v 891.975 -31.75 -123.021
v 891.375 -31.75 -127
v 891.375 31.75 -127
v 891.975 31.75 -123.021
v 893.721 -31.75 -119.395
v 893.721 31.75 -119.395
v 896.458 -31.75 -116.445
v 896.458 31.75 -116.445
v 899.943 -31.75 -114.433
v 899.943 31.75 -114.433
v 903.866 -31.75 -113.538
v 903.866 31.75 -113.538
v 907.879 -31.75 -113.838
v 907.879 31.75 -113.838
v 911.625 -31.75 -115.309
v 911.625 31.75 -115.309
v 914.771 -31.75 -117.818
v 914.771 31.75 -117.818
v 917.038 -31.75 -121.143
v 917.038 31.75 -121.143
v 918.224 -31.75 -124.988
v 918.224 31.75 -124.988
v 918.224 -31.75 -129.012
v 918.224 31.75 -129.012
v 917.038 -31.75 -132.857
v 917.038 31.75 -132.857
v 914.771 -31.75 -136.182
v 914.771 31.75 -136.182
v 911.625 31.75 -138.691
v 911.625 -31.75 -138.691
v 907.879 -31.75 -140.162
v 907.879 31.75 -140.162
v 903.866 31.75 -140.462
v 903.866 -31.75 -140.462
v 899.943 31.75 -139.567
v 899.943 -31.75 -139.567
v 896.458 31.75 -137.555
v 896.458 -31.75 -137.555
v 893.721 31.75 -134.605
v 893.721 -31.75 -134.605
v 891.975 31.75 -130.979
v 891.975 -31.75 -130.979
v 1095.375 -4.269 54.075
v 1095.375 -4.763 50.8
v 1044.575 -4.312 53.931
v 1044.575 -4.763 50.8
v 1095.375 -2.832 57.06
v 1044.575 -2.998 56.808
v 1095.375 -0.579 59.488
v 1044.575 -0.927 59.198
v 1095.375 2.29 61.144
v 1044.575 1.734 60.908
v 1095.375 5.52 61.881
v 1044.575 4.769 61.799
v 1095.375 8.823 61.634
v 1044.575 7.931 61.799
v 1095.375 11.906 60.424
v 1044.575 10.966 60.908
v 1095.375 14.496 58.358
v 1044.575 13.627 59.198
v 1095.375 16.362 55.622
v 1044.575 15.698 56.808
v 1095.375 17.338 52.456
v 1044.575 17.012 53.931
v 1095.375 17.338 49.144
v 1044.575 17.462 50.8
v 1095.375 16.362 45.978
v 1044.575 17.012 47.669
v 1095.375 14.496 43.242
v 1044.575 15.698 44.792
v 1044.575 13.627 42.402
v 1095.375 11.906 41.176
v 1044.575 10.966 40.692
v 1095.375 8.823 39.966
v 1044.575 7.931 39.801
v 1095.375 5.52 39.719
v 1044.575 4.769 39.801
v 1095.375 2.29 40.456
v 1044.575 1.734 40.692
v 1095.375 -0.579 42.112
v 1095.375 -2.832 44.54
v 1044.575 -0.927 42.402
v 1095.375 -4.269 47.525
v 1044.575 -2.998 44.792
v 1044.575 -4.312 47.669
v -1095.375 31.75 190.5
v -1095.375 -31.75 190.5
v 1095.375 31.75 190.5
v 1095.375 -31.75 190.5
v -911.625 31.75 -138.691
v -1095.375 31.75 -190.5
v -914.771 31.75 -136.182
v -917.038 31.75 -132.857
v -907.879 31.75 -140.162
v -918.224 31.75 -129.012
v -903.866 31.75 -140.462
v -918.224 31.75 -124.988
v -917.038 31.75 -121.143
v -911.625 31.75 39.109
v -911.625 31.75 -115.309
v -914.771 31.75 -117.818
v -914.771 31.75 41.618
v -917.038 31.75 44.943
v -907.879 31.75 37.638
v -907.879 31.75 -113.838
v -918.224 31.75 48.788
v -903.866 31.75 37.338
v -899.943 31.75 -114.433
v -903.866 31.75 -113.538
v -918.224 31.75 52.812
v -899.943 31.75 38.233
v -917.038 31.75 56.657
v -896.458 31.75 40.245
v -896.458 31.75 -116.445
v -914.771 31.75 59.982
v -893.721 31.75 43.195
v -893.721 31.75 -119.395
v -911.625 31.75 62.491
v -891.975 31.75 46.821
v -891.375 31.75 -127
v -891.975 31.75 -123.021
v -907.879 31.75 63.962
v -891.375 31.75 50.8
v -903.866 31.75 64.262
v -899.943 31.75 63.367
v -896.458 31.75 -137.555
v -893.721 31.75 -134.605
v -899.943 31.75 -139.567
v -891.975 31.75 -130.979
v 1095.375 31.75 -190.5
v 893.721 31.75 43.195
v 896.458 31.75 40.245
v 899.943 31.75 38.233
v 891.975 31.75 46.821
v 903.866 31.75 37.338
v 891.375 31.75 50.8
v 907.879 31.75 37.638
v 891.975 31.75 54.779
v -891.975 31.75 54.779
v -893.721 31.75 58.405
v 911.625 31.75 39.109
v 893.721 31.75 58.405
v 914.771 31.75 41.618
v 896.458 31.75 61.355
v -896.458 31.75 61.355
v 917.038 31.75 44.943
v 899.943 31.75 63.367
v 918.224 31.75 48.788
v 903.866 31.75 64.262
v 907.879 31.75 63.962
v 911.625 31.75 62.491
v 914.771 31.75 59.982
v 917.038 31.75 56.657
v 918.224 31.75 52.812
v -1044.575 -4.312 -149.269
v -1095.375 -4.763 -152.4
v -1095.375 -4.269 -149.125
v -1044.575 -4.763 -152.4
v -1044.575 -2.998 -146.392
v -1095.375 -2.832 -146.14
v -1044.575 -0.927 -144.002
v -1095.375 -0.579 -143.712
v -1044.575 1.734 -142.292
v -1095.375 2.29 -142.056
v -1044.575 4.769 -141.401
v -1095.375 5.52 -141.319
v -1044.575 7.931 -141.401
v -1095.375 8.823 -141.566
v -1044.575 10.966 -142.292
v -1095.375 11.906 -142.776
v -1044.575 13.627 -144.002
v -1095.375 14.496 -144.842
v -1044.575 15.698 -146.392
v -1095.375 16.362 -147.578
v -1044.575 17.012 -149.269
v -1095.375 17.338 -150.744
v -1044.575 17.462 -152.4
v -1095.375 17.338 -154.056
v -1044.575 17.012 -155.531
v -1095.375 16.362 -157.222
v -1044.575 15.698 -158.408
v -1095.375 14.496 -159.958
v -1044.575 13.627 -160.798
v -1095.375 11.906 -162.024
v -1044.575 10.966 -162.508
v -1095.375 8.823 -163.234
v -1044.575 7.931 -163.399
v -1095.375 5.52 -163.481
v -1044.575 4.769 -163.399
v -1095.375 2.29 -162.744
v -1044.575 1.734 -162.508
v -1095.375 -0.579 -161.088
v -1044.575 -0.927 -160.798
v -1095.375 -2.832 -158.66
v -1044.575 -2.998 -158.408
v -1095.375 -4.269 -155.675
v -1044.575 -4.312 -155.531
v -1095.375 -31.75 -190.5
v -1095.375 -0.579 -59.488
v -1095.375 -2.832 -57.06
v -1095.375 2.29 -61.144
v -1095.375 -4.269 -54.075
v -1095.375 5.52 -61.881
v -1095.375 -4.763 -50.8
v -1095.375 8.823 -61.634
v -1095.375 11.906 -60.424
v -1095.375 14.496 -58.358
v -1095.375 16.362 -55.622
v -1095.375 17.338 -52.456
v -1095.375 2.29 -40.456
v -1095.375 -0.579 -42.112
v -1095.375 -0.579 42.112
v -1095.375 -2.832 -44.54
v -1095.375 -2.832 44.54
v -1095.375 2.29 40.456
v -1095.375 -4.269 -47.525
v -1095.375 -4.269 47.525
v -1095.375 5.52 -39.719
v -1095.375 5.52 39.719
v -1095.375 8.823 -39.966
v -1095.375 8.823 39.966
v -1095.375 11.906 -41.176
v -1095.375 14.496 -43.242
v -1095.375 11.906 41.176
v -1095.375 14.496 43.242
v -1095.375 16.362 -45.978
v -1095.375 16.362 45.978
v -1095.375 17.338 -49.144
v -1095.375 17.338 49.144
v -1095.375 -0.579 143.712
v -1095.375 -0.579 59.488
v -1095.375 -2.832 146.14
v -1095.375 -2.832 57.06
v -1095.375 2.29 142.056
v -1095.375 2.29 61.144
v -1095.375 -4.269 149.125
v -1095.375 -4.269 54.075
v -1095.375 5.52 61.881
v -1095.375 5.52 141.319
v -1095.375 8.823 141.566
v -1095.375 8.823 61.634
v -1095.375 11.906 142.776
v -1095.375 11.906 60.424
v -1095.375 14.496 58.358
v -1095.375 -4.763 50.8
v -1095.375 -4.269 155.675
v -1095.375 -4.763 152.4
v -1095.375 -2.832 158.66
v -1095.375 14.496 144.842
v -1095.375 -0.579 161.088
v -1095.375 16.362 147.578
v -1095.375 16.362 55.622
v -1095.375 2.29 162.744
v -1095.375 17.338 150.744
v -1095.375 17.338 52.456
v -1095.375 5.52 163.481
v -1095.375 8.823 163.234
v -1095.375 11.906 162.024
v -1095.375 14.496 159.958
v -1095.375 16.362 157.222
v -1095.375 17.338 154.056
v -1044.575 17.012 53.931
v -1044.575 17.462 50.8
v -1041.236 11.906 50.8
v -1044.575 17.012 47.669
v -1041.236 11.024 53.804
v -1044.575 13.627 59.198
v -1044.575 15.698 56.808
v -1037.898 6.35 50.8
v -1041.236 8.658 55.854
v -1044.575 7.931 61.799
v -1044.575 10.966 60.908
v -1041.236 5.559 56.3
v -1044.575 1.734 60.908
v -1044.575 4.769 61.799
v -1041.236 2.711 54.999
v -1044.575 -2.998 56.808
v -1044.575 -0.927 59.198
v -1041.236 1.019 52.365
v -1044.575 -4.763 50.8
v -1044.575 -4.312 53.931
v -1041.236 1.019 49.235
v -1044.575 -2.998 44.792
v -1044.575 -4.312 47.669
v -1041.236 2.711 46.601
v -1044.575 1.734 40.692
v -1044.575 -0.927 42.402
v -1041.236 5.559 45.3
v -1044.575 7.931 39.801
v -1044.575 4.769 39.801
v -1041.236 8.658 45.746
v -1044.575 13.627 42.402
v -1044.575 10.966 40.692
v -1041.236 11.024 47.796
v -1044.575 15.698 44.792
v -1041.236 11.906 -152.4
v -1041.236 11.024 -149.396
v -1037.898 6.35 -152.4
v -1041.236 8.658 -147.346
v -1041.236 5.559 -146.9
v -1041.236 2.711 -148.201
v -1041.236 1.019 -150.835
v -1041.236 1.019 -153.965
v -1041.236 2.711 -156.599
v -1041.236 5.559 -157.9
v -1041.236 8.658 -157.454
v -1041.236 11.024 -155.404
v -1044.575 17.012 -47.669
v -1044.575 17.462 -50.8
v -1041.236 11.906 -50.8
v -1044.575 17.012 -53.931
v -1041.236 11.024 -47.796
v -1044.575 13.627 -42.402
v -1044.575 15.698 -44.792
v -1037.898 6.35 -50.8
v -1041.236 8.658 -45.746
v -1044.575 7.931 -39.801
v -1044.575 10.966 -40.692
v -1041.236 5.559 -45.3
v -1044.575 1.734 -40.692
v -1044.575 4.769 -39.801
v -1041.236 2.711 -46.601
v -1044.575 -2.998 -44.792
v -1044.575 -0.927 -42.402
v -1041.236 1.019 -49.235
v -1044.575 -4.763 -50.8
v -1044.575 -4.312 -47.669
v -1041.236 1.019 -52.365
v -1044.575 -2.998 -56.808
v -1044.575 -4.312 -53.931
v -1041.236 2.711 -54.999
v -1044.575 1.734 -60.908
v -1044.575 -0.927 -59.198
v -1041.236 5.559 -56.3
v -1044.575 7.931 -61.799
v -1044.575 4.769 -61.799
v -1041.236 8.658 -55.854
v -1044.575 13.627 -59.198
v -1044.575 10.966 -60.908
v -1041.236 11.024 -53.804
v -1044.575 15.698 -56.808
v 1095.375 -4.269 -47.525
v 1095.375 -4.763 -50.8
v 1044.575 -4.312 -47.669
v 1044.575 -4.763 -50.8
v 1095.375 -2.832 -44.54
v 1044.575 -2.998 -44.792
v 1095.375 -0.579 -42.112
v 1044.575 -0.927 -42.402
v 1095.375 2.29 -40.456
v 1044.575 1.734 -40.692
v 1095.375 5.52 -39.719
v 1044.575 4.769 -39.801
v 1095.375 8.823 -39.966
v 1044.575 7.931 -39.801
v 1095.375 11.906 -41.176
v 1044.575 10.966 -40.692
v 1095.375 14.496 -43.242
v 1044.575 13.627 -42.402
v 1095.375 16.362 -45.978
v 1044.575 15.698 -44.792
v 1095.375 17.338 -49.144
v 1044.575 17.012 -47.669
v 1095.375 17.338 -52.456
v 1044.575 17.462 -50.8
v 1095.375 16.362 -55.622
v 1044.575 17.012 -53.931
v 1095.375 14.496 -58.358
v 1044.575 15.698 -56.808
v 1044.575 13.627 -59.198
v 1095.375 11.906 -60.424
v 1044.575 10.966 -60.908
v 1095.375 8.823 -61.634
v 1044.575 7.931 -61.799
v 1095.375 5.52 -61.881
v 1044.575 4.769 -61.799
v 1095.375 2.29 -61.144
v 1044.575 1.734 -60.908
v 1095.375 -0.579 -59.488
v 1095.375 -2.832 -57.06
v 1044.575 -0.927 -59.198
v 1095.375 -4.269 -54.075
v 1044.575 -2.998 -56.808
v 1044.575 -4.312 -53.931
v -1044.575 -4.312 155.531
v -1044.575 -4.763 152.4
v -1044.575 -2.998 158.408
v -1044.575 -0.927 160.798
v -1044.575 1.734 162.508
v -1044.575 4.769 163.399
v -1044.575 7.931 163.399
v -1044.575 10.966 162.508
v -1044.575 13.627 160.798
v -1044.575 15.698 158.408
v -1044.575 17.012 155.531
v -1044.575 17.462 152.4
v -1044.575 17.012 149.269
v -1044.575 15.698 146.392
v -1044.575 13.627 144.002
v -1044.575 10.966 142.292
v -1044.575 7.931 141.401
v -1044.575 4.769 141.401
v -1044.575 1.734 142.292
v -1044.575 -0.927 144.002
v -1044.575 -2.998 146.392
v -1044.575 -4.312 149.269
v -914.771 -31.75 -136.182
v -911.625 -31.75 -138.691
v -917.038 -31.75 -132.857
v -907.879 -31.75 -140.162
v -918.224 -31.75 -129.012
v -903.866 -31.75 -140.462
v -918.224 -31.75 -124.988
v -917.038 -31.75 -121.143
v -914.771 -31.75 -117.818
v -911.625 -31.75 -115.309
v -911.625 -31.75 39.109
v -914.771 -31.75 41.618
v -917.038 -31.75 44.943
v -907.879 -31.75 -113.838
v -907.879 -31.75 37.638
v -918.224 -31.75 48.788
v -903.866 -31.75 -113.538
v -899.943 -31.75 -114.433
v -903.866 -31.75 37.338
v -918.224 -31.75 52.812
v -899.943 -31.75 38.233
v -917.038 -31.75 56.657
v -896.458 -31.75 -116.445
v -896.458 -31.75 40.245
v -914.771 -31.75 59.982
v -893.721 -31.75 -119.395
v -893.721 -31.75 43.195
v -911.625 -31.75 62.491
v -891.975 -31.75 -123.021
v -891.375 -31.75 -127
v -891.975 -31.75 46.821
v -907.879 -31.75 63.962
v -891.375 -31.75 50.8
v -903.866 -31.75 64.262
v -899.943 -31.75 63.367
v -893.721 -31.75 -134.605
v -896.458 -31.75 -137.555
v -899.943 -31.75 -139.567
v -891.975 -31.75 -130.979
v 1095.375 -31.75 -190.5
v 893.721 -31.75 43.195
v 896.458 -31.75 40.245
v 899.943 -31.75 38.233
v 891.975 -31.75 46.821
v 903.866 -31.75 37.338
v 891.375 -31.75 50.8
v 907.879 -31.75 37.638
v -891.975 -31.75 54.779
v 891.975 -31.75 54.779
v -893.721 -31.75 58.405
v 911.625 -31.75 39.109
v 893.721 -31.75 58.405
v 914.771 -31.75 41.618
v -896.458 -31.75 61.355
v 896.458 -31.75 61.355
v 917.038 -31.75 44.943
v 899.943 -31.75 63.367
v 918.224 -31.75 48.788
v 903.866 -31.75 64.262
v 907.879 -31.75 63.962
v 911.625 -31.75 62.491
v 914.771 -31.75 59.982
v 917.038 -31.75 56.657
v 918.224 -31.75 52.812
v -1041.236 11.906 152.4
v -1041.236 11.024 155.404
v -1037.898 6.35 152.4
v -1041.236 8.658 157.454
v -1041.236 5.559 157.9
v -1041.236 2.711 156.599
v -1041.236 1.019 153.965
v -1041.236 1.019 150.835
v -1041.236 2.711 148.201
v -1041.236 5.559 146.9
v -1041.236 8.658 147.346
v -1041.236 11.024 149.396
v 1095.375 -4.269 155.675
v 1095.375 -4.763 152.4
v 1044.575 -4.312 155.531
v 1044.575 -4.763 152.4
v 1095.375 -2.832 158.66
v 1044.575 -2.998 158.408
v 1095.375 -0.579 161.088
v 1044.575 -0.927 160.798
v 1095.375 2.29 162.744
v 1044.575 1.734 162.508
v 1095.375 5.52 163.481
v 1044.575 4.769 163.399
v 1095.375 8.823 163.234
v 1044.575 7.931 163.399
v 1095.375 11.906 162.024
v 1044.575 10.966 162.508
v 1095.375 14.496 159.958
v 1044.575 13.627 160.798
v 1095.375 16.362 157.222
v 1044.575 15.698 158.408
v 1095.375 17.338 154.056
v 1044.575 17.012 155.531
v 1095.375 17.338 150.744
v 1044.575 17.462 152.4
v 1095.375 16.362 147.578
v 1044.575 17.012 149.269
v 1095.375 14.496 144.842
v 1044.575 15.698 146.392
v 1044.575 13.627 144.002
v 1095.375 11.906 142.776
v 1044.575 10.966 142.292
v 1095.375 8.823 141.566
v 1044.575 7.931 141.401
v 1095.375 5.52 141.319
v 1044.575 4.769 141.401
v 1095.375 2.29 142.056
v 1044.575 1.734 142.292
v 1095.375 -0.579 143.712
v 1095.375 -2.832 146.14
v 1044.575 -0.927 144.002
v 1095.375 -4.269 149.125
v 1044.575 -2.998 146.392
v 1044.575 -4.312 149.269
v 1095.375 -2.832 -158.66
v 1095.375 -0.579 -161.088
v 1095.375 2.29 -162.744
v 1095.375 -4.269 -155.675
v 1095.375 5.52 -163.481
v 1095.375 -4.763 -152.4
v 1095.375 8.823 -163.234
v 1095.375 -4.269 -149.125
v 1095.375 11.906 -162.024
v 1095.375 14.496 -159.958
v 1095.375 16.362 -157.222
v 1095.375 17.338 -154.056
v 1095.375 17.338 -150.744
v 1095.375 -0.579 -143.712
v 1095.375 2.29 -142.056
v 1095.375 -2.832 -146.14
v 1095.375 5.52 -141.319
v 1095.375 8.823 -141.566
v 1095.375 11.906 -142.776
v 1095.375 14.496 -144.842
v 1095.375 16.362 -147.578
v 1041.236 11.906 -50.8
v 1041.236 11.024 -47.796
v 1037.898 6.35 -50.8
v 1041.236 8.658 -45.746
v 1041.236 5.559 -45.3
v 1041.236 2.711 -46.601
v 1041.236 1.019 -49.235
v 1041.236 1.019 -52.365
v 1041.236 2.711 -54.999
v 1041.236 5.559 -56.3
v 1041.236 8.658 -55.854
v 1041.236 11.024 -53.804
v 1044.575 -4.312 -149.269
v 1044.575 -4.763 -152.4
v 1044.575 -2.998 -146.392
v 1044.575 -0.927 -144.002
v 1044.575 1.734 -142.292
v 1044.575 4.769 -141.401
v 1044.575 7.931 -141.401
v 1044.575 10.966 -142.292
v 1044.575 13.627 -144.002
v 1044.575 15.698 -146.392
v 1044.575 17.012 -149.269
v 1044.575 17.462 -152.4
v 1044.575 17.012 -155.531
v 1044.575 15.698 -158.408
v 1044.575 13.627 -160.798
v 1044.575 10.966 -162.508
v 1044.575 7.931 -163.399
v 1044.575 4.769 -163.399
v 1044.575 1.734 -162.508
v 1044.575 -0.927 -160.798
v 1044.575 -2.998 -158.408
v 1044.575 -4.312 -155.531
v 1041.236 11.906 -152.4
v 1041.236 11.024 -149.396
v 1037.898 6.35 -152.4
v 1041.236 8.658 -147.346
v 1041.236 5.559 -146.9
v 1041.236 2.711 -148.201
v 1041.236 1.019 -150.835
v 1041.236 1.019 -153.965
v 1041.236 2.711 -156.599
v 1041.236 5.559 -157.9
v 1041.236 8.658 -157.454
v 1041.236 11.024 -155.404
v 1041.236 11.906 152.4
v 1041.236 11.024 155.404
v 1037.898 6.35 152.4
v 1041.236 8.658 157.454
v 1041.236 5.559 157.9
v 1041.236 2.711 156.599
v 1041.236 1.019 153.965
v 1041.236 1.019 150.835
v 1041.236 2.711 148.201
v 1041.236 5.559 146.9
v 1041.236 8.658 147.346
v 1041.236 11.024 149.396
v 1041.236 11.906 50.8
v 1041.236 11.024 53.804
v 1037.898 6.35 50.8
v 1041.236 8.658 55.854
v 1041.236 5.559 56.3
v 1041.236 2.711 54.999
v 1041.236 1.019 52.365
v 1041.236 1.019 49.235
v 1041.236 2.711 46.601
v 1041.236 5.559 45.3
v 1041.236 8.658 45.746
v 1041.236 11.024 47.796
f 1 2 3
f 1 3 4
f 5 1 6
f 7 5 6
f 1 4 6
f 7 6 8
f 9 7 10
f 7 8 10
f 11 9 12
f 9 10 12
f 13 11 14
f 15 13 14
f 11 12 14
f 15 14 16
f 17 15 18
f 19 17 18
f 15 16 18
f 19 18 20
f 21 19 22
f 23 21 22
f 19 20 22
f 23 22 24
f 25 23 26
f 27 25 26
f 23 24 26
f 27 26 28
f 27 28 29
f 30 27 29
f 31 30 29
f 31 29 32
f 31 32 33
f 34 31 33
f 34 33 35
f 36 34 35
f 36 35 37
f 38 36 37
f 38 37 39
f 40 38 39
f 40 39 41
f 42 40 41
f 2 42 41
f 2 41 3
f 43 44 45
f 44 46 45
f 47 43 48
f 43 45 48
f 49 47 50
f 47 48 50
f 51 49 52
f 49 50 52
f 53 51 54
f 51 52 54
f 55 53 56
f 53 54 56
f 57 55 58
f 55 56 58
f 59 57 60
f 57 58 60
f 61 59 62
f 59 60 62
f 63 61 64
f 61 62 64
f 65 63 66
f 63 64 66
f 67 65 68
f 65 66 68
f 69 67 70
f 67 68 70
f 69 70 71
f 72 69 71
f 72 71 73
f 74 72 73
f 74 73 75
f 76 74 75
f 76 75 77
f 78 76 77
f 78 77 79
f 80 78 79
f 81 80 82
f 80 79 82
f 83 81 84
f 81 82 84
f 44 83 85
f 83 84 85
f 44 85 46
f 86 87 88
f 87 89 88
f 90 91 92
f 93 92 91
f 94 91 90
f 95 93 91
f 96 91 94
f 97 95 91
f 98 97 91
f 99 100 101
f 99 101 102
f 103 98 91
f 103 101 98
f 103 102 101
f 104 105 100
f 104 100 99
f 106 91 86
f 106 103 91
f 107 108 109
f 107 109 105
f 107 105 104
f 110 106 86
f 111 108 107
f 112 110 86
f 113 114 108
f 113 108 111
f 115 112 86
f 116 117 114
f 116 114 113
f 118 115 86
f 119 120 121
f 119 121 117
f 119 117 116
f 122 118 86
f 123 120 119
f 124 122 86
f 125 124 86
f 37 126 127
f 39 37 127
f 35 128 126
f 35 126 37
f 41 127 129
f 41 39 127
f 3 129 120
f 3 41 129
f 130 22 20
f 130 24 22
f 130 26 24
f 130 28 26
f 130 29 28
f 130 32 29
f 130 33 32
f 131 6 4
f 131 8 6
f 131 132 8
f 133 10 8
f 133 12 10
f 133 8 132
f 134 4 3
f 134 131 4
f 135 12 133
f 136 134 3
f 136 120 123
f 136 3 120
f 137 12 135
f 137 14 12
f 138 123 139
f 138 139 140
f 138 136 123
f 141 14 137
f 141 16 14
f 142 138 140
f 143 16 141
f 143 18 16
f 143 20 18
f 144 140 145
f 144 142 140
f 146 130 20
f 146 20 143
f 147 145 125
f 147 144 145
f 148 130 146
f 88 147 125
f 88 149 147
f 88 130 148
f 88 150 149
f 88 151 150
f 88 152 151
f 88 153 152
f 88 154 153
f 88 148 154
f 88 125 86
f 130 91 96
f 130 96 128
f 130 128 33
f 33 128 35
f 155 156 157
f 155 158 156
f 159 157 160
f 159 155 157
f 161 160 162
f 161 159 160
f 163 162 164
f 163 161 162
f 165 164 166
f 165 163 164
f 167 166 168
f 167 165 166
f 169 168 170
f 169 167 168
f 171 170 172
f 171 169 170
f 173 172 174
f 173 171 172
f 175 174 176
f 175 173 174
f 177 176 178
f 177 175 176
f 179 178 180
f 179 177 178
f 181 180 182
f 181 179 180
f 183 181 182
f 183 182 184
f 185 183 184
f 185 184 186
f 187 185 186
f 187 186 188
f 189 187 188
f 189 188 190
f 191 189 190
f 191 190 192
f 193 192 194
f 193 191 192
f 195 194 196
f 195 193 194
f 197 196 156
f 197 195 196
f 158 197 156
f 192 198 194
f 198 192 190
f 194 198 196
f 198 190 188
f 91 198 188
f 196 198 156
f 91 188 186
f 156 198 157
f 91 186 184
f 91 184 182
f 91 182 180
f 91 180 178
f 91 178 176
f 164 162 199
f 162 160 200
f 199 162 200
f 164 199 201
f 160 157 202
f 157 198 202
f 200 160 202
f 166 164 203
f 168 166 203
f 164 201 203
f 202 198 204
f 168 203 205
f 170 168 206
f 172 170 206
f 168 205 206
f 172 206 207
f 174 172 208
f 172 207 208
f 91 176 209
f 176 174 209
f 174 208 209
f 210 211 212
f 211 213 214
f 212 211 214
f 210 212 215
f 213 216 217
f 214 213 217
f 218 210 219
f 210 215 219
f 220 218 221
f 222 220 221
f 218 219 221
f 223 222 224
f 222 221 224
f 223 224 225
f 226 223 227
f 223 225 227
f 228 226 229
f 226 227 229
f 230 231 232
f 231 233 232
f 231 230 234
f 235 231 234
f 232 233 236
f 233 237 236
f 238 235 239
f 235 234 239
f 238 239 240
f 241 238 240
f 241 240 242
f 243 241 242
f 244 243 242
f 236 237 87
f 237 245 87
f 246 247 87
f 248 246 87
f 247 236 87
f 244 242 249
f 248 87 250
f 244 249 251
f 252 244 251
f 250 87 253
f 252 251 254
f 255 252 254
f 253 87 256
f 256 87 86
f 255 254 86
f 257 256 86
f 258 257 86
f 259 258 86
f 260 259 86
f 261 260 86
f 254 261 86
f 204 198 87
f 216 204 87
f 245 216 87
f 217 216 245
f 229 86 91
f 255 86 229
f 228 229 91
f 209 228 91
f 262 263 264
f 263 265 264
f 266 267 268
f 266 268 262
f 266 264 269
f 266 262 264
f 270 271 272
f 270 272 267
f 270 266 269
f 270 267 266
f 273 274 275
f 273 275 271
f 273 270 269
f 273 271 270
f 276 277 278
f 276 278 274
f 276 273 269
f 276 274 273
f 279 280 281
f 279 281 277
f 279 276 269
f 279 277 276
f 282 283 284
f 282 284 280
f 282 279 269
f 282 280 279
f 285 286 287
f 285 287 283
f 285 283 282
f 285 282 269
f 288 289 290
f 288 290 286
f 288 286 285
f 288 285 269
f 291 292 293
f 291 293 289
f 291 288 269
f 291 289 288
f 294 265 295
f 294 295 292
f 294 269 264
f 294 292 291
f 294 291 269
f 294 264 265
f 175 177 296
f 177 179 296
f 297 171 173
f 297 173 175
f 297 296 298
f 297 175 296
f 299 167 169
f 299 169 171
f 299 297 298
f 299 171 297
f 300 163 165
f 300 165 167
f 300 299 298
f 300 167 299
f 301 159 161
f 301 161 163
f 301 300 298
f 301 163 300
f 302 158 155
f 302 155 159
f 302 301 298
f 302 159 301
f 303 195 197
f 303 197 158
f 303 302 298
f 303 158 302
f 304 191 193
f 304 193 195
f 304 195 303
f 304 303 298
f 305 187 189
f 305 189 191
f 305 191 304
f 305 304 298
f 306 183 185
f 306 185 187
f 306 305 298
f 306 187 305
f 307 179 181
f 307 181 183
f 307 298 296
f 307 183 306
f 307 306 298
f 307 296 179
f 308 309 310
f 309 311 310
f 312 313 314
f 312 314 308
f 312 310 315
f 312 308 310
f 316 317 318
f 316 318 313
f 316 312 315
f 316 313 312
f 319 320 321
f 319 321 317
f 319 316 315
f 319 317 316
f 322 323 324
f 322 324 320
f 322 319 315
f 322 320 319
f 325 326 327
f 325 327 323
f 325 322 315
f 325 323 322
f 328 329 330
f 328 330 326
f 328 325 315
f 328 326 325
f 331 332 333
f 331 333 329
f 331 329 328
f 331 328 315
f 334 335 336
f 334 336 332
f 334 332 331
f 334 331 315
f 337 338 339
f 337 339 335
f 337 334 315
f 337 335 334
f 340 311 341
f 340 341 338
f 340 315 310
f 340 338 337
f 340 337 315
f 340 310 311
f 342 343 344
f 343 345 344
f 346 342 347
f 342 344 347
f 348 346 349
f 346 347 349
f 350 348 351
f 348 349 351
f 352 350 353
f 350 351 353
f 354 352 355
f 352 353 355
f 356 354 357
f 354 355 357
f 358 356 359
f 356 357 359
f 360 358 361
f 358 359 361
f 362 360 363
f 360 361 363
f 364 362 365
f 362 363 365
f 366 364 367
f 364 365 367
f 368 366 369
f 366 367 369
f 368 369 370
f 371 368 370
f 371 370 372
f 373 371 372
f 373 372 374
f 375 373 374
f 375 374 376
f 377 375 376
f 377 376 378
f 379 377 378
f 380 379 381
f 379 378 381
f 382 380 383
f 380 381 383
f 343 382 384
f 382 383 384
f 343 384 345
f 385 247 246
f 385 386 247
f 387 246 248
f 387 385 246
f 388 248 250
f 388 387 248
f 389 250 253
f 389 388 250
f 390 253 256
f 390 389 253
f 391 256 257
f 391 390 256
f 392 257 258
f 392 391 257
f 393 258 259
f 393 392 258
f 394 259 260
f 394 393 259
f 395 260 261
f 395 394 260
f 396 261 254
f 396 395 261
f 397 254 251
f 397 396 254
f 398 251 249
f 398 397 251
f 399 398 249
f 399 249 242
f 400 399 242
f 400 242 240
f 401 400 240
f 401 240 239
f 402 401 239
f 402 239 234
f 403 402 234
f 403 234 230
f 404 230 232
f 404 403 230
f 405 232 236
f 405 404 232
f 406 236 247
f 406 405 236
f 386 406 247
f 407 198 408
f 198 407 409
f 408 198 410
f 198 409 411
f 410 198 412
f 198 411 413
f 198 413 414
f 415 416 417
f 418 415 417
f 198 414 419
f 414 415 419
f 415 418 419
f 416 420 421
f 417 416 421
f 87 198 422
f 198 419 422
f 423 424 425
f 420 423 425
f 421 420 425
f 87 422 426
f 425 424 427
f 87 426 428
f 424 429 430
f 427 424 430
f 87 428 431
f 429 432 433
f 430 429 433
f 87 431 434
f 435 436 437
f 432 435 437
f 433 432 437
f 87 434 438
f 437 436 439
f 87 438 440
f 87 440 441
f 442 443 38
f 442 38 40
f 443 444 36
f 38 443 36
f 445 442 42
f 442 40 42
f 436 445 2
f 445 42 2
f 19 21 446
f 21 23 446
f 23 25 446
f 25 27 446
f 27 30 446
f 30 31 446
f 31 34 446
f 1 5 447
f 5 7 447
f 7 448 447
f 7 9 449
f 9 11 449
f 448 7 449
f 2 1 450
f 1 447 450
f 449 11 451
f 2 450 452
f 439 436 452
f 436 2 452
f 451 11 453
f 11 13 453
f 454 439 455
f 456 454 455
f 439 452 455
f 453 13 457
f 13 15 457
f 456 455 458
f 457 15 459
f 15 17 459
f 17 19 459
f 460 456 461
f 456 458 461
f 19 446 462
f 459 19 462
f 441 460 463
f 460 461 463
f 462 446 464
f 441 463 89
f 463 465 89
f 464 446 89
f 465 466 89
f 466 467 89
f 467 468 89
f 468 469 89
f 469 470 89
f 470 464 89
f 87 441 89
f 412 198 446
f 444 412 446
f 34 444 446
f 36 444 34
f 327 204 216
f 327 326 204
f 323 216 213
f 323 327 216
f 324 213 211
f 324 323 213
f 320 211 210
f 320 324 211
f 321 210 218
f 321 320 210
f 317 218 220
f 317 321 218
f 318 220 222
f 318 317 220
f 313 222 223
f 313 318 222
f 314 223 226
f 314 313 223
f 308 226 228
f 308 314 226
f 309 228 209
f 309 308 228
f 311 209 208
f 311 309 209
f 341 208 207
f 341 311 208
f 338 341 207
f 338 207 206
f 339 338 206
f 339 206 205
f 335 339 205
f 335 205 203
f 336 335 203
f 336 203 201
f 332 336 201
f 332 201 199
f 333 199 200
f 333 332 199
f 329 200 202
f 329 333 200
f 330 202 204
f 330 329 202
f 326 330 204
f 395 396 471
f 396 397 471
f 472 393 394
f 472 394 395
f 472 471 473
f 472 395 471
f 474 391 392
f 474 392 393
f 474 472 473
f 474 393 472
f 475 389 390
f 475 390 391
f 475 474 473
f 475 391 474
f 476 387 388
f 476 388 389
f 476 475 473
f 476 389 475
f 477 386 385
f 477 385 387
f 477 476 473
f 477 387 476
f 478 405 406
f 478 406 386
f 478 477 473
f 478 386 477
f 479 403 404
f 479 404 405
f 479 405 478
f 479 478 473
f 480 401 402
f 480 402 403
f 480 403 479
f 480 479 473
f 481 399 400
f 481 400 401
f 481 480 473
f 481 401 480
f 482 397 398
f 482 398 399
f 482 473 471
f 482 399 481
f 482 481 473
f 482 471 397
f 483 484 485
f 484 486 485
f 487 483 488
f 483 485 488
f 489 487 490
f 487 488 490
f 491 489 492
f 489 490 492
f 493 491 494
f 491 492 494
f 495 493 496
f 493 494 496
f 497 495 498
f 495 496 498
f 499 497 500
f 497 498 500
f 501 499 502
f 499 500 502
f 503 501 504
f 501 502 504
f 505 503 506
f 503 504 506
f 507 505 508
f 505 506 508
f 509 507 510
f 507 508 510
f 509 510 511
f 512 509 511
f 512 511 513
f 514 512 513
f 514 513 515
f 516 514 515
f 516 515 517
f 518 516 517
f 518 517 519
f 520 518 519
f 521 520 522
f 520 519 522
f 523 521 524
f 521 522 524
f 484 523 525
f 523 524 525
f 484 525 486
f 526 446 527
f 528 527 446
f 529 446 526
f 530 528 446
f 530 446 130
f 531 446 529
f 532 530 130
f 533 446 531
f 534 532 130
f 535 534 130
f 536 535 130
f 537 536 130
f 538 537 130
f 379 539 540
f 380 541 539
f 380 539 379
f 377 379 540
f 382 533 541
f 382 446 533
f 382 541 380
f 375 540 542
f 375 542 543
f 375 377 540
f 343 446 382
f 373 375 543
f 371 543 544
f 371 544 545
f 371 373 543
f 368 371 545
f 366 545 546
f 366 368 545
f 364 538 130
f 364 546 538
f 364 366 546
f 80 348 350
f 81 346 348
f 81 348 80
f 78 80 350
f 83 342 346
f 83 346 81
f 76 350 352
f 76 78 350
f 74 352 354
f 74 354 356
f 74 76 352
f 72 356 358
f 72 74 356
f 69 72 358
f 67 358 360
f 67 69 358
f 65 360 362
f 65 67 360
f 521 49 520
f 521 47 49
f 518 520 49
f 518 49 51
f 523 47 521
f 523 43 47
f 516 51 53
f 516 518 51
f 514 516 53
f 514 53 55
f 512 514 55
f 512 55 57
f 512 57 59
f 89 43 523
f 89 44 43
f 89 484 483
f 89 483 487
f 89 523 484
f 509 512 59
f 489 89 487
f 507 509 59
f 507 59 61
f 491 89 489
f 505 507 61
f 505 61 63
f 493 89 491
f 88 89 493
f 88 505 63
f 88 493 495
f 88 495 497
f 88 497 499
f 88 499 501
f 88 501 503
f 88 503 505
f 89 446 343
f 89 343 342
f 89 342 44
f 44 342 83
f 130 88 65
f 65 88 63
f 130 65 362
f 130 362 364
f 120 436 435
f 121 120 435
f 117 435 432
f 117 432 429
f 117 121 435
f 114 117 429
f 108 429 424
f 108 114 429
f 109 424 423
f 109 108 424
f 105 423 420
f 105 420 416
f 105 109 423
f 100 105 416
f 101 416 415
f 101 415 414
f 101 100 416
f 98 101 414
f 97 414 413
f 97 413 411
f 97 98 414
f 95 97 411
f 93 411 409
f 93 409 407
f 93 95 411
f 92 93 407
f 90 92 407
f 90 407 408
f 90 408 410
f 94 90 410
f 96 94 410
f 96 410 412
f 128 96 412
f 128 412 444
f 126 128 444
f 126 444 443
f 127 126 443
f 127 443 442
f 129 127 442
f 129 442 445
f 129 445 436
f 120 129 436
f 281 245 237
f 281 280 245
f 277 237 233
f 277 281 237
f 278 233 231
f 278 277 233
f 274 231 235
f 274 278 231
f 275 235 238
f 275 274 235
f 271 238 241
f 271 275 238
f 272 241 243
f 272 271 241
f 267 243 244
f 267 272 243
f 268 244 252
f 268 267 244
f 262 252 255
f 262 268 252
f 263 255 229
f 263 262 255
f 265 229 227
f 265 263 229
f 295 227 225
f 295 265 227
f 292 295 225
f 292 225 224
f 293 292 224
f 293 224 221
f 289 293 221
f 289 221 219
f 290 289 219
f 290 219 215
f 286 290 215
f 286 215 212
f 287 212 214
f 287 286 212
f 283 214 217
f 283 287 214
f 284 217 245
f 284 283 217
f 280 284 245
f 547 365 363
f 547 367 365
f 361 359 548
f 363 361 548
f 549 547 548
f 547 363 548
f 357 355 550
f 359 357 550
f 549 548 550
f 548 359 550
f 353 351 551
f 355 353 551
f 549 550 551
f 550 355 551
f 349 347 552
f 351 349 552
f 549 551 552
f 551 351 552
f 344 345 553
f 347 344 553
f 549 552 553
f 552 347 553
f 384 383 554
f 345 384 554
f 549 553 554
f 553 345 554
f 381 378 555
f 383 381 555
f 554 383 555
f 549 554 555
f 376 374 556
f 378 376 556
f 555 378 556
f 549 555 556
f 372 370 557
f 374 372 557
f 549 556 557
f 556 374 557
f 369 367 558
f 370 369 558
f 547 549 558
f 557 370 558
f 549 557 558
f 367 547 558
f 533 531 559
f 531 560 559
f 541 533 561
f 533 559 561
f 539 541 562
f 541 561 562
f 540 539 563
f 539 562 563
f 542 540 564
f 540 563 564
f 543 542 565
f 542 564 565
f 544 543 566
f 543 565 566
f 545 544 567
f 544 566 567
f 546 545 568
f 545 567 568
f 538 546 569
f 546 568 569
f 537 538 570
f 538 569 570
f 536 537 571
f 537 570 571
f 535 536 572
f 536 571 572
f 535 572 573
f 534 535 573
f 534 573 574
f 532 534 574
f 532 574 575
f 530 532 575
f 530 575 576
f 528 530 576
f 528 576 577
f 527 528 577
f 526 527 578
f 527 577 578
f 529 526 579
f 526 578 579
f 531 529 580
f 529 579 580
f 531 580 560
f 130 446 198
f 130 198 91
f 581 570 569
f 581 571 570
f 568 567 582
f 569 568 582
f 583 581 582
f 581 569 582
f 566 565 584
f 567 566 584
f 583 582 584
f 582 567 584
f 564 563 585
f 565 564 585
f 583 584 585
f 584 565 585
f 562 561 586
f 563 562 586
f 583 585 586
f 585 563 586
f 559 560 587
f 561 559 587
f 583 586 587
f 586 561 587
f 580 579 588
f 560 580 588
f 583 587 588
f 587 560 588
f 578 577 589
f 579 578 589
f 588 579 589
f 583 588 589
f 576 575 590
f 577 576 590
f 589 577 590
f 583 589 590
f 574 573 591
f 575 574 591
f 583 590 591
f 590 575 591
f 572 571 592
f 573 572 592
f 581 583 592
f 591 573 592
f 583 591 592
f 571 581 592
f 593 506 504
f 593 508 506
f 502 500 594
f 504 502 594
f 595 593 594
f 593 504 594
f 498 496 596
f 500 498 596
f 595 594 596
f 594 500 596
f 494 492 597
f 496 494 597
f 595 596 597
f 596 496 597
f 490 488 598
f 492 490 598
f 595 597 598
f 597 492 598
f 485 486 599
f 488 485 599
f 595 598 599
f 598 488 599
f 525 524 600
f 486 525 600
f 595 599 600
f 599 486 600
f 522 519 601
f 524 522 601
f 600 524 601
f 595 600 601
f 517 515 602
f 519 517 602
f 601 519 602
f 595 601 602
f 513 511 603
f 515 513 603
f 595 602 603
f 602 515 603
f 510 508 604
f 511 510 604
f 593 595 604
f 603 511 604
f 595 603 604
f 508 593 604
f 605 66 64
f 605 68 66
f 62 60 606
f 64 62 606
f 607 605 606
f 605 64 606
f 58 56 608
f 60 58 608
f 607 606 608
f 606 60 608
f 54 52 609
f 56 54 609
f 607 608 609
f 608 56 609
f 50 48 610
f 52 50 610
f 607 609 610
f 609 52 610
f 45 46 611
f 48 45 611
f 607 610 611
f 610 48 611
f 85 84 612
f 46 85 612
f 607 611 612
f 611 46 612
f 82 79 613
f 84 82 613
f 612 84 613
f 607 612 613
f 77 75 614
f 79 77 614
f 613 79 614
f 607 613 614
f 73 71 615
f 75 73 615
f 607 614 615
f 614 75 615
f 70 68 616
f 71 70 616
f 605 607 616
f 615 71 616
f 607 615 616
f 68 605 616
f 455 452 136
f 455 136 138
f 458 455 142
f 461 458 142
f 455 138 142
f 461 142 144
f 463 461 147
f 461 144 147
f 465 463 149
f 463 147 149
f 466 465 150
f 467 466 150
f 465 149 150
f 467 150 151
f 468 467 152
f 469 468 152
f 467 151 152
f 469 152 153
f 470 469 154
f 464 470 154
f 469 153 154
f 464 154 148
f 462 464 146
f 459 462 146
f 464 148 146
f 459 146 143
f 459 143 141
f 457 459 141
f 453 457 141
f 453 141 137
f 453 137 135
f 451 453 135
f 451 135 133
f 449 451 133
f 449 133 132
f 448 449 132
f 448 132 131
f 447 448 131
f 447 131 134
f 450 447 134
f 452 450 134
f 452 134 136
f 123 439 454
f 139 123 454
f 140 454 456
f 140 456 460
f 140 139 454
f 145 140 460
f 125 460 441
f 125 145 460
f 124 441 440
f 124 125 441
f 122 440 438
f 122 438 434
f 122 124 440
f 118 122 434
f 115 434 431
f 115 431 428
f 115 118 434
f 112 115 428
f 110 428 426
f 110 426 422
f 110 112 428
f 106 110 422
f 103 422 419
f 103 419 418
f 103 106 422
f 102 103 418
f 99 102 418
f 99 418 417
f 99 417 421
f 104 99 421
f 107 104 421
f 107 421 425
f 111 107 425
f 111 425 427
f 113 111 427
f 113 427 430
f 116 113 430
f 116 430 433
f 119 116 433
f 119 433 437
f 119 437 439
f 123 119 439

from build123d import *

# Parameters (mm, degrees)
F0_W     = 63.5
F0_H     = 381
F1_DEPTH = 1095.375
F3_D     = 22.225
F3_DEPTH = 50.8
F3_TIP   = 6.6770636289
F5_D     = 27.0002


with BuildPart() as f1:
    # F0 (on Right) → F1 (new body)
    with BuildSketch(Plane.YZ):
        Rectangle(F0_W, F0_H)
    extrude(amount=F1_DEPTH)

    # F3
    with Locations(Plane.YZ.offset(1095.375)):
        with Locations((6.35, 152.4), (6.35, 50.8), (6.35, -50.8), (6.35, -152.4)):
            Hole(F3_D / 2, depth=F3_DEPTH)
            with Locations((0, 0, -(F3_DEPTH + F3_TIP / 2))):  # 118° drill point
                Cone(0, F3_D / 2, F3_TIP, mode=Mode.SUBTRACT)

    # F5 (through all)
    with Locations(Plane.XZ.offset(31.75)):
        with Locations((904.875, 50.8), (904.875, -127)):
            Hole(F5_D / 2)

    # F6: F1 across plane


with BuildPart() as f1_1:
    add(f1.part)
    add(f1.part.mirror(Plane.YZ))


solid = f1_1.part
